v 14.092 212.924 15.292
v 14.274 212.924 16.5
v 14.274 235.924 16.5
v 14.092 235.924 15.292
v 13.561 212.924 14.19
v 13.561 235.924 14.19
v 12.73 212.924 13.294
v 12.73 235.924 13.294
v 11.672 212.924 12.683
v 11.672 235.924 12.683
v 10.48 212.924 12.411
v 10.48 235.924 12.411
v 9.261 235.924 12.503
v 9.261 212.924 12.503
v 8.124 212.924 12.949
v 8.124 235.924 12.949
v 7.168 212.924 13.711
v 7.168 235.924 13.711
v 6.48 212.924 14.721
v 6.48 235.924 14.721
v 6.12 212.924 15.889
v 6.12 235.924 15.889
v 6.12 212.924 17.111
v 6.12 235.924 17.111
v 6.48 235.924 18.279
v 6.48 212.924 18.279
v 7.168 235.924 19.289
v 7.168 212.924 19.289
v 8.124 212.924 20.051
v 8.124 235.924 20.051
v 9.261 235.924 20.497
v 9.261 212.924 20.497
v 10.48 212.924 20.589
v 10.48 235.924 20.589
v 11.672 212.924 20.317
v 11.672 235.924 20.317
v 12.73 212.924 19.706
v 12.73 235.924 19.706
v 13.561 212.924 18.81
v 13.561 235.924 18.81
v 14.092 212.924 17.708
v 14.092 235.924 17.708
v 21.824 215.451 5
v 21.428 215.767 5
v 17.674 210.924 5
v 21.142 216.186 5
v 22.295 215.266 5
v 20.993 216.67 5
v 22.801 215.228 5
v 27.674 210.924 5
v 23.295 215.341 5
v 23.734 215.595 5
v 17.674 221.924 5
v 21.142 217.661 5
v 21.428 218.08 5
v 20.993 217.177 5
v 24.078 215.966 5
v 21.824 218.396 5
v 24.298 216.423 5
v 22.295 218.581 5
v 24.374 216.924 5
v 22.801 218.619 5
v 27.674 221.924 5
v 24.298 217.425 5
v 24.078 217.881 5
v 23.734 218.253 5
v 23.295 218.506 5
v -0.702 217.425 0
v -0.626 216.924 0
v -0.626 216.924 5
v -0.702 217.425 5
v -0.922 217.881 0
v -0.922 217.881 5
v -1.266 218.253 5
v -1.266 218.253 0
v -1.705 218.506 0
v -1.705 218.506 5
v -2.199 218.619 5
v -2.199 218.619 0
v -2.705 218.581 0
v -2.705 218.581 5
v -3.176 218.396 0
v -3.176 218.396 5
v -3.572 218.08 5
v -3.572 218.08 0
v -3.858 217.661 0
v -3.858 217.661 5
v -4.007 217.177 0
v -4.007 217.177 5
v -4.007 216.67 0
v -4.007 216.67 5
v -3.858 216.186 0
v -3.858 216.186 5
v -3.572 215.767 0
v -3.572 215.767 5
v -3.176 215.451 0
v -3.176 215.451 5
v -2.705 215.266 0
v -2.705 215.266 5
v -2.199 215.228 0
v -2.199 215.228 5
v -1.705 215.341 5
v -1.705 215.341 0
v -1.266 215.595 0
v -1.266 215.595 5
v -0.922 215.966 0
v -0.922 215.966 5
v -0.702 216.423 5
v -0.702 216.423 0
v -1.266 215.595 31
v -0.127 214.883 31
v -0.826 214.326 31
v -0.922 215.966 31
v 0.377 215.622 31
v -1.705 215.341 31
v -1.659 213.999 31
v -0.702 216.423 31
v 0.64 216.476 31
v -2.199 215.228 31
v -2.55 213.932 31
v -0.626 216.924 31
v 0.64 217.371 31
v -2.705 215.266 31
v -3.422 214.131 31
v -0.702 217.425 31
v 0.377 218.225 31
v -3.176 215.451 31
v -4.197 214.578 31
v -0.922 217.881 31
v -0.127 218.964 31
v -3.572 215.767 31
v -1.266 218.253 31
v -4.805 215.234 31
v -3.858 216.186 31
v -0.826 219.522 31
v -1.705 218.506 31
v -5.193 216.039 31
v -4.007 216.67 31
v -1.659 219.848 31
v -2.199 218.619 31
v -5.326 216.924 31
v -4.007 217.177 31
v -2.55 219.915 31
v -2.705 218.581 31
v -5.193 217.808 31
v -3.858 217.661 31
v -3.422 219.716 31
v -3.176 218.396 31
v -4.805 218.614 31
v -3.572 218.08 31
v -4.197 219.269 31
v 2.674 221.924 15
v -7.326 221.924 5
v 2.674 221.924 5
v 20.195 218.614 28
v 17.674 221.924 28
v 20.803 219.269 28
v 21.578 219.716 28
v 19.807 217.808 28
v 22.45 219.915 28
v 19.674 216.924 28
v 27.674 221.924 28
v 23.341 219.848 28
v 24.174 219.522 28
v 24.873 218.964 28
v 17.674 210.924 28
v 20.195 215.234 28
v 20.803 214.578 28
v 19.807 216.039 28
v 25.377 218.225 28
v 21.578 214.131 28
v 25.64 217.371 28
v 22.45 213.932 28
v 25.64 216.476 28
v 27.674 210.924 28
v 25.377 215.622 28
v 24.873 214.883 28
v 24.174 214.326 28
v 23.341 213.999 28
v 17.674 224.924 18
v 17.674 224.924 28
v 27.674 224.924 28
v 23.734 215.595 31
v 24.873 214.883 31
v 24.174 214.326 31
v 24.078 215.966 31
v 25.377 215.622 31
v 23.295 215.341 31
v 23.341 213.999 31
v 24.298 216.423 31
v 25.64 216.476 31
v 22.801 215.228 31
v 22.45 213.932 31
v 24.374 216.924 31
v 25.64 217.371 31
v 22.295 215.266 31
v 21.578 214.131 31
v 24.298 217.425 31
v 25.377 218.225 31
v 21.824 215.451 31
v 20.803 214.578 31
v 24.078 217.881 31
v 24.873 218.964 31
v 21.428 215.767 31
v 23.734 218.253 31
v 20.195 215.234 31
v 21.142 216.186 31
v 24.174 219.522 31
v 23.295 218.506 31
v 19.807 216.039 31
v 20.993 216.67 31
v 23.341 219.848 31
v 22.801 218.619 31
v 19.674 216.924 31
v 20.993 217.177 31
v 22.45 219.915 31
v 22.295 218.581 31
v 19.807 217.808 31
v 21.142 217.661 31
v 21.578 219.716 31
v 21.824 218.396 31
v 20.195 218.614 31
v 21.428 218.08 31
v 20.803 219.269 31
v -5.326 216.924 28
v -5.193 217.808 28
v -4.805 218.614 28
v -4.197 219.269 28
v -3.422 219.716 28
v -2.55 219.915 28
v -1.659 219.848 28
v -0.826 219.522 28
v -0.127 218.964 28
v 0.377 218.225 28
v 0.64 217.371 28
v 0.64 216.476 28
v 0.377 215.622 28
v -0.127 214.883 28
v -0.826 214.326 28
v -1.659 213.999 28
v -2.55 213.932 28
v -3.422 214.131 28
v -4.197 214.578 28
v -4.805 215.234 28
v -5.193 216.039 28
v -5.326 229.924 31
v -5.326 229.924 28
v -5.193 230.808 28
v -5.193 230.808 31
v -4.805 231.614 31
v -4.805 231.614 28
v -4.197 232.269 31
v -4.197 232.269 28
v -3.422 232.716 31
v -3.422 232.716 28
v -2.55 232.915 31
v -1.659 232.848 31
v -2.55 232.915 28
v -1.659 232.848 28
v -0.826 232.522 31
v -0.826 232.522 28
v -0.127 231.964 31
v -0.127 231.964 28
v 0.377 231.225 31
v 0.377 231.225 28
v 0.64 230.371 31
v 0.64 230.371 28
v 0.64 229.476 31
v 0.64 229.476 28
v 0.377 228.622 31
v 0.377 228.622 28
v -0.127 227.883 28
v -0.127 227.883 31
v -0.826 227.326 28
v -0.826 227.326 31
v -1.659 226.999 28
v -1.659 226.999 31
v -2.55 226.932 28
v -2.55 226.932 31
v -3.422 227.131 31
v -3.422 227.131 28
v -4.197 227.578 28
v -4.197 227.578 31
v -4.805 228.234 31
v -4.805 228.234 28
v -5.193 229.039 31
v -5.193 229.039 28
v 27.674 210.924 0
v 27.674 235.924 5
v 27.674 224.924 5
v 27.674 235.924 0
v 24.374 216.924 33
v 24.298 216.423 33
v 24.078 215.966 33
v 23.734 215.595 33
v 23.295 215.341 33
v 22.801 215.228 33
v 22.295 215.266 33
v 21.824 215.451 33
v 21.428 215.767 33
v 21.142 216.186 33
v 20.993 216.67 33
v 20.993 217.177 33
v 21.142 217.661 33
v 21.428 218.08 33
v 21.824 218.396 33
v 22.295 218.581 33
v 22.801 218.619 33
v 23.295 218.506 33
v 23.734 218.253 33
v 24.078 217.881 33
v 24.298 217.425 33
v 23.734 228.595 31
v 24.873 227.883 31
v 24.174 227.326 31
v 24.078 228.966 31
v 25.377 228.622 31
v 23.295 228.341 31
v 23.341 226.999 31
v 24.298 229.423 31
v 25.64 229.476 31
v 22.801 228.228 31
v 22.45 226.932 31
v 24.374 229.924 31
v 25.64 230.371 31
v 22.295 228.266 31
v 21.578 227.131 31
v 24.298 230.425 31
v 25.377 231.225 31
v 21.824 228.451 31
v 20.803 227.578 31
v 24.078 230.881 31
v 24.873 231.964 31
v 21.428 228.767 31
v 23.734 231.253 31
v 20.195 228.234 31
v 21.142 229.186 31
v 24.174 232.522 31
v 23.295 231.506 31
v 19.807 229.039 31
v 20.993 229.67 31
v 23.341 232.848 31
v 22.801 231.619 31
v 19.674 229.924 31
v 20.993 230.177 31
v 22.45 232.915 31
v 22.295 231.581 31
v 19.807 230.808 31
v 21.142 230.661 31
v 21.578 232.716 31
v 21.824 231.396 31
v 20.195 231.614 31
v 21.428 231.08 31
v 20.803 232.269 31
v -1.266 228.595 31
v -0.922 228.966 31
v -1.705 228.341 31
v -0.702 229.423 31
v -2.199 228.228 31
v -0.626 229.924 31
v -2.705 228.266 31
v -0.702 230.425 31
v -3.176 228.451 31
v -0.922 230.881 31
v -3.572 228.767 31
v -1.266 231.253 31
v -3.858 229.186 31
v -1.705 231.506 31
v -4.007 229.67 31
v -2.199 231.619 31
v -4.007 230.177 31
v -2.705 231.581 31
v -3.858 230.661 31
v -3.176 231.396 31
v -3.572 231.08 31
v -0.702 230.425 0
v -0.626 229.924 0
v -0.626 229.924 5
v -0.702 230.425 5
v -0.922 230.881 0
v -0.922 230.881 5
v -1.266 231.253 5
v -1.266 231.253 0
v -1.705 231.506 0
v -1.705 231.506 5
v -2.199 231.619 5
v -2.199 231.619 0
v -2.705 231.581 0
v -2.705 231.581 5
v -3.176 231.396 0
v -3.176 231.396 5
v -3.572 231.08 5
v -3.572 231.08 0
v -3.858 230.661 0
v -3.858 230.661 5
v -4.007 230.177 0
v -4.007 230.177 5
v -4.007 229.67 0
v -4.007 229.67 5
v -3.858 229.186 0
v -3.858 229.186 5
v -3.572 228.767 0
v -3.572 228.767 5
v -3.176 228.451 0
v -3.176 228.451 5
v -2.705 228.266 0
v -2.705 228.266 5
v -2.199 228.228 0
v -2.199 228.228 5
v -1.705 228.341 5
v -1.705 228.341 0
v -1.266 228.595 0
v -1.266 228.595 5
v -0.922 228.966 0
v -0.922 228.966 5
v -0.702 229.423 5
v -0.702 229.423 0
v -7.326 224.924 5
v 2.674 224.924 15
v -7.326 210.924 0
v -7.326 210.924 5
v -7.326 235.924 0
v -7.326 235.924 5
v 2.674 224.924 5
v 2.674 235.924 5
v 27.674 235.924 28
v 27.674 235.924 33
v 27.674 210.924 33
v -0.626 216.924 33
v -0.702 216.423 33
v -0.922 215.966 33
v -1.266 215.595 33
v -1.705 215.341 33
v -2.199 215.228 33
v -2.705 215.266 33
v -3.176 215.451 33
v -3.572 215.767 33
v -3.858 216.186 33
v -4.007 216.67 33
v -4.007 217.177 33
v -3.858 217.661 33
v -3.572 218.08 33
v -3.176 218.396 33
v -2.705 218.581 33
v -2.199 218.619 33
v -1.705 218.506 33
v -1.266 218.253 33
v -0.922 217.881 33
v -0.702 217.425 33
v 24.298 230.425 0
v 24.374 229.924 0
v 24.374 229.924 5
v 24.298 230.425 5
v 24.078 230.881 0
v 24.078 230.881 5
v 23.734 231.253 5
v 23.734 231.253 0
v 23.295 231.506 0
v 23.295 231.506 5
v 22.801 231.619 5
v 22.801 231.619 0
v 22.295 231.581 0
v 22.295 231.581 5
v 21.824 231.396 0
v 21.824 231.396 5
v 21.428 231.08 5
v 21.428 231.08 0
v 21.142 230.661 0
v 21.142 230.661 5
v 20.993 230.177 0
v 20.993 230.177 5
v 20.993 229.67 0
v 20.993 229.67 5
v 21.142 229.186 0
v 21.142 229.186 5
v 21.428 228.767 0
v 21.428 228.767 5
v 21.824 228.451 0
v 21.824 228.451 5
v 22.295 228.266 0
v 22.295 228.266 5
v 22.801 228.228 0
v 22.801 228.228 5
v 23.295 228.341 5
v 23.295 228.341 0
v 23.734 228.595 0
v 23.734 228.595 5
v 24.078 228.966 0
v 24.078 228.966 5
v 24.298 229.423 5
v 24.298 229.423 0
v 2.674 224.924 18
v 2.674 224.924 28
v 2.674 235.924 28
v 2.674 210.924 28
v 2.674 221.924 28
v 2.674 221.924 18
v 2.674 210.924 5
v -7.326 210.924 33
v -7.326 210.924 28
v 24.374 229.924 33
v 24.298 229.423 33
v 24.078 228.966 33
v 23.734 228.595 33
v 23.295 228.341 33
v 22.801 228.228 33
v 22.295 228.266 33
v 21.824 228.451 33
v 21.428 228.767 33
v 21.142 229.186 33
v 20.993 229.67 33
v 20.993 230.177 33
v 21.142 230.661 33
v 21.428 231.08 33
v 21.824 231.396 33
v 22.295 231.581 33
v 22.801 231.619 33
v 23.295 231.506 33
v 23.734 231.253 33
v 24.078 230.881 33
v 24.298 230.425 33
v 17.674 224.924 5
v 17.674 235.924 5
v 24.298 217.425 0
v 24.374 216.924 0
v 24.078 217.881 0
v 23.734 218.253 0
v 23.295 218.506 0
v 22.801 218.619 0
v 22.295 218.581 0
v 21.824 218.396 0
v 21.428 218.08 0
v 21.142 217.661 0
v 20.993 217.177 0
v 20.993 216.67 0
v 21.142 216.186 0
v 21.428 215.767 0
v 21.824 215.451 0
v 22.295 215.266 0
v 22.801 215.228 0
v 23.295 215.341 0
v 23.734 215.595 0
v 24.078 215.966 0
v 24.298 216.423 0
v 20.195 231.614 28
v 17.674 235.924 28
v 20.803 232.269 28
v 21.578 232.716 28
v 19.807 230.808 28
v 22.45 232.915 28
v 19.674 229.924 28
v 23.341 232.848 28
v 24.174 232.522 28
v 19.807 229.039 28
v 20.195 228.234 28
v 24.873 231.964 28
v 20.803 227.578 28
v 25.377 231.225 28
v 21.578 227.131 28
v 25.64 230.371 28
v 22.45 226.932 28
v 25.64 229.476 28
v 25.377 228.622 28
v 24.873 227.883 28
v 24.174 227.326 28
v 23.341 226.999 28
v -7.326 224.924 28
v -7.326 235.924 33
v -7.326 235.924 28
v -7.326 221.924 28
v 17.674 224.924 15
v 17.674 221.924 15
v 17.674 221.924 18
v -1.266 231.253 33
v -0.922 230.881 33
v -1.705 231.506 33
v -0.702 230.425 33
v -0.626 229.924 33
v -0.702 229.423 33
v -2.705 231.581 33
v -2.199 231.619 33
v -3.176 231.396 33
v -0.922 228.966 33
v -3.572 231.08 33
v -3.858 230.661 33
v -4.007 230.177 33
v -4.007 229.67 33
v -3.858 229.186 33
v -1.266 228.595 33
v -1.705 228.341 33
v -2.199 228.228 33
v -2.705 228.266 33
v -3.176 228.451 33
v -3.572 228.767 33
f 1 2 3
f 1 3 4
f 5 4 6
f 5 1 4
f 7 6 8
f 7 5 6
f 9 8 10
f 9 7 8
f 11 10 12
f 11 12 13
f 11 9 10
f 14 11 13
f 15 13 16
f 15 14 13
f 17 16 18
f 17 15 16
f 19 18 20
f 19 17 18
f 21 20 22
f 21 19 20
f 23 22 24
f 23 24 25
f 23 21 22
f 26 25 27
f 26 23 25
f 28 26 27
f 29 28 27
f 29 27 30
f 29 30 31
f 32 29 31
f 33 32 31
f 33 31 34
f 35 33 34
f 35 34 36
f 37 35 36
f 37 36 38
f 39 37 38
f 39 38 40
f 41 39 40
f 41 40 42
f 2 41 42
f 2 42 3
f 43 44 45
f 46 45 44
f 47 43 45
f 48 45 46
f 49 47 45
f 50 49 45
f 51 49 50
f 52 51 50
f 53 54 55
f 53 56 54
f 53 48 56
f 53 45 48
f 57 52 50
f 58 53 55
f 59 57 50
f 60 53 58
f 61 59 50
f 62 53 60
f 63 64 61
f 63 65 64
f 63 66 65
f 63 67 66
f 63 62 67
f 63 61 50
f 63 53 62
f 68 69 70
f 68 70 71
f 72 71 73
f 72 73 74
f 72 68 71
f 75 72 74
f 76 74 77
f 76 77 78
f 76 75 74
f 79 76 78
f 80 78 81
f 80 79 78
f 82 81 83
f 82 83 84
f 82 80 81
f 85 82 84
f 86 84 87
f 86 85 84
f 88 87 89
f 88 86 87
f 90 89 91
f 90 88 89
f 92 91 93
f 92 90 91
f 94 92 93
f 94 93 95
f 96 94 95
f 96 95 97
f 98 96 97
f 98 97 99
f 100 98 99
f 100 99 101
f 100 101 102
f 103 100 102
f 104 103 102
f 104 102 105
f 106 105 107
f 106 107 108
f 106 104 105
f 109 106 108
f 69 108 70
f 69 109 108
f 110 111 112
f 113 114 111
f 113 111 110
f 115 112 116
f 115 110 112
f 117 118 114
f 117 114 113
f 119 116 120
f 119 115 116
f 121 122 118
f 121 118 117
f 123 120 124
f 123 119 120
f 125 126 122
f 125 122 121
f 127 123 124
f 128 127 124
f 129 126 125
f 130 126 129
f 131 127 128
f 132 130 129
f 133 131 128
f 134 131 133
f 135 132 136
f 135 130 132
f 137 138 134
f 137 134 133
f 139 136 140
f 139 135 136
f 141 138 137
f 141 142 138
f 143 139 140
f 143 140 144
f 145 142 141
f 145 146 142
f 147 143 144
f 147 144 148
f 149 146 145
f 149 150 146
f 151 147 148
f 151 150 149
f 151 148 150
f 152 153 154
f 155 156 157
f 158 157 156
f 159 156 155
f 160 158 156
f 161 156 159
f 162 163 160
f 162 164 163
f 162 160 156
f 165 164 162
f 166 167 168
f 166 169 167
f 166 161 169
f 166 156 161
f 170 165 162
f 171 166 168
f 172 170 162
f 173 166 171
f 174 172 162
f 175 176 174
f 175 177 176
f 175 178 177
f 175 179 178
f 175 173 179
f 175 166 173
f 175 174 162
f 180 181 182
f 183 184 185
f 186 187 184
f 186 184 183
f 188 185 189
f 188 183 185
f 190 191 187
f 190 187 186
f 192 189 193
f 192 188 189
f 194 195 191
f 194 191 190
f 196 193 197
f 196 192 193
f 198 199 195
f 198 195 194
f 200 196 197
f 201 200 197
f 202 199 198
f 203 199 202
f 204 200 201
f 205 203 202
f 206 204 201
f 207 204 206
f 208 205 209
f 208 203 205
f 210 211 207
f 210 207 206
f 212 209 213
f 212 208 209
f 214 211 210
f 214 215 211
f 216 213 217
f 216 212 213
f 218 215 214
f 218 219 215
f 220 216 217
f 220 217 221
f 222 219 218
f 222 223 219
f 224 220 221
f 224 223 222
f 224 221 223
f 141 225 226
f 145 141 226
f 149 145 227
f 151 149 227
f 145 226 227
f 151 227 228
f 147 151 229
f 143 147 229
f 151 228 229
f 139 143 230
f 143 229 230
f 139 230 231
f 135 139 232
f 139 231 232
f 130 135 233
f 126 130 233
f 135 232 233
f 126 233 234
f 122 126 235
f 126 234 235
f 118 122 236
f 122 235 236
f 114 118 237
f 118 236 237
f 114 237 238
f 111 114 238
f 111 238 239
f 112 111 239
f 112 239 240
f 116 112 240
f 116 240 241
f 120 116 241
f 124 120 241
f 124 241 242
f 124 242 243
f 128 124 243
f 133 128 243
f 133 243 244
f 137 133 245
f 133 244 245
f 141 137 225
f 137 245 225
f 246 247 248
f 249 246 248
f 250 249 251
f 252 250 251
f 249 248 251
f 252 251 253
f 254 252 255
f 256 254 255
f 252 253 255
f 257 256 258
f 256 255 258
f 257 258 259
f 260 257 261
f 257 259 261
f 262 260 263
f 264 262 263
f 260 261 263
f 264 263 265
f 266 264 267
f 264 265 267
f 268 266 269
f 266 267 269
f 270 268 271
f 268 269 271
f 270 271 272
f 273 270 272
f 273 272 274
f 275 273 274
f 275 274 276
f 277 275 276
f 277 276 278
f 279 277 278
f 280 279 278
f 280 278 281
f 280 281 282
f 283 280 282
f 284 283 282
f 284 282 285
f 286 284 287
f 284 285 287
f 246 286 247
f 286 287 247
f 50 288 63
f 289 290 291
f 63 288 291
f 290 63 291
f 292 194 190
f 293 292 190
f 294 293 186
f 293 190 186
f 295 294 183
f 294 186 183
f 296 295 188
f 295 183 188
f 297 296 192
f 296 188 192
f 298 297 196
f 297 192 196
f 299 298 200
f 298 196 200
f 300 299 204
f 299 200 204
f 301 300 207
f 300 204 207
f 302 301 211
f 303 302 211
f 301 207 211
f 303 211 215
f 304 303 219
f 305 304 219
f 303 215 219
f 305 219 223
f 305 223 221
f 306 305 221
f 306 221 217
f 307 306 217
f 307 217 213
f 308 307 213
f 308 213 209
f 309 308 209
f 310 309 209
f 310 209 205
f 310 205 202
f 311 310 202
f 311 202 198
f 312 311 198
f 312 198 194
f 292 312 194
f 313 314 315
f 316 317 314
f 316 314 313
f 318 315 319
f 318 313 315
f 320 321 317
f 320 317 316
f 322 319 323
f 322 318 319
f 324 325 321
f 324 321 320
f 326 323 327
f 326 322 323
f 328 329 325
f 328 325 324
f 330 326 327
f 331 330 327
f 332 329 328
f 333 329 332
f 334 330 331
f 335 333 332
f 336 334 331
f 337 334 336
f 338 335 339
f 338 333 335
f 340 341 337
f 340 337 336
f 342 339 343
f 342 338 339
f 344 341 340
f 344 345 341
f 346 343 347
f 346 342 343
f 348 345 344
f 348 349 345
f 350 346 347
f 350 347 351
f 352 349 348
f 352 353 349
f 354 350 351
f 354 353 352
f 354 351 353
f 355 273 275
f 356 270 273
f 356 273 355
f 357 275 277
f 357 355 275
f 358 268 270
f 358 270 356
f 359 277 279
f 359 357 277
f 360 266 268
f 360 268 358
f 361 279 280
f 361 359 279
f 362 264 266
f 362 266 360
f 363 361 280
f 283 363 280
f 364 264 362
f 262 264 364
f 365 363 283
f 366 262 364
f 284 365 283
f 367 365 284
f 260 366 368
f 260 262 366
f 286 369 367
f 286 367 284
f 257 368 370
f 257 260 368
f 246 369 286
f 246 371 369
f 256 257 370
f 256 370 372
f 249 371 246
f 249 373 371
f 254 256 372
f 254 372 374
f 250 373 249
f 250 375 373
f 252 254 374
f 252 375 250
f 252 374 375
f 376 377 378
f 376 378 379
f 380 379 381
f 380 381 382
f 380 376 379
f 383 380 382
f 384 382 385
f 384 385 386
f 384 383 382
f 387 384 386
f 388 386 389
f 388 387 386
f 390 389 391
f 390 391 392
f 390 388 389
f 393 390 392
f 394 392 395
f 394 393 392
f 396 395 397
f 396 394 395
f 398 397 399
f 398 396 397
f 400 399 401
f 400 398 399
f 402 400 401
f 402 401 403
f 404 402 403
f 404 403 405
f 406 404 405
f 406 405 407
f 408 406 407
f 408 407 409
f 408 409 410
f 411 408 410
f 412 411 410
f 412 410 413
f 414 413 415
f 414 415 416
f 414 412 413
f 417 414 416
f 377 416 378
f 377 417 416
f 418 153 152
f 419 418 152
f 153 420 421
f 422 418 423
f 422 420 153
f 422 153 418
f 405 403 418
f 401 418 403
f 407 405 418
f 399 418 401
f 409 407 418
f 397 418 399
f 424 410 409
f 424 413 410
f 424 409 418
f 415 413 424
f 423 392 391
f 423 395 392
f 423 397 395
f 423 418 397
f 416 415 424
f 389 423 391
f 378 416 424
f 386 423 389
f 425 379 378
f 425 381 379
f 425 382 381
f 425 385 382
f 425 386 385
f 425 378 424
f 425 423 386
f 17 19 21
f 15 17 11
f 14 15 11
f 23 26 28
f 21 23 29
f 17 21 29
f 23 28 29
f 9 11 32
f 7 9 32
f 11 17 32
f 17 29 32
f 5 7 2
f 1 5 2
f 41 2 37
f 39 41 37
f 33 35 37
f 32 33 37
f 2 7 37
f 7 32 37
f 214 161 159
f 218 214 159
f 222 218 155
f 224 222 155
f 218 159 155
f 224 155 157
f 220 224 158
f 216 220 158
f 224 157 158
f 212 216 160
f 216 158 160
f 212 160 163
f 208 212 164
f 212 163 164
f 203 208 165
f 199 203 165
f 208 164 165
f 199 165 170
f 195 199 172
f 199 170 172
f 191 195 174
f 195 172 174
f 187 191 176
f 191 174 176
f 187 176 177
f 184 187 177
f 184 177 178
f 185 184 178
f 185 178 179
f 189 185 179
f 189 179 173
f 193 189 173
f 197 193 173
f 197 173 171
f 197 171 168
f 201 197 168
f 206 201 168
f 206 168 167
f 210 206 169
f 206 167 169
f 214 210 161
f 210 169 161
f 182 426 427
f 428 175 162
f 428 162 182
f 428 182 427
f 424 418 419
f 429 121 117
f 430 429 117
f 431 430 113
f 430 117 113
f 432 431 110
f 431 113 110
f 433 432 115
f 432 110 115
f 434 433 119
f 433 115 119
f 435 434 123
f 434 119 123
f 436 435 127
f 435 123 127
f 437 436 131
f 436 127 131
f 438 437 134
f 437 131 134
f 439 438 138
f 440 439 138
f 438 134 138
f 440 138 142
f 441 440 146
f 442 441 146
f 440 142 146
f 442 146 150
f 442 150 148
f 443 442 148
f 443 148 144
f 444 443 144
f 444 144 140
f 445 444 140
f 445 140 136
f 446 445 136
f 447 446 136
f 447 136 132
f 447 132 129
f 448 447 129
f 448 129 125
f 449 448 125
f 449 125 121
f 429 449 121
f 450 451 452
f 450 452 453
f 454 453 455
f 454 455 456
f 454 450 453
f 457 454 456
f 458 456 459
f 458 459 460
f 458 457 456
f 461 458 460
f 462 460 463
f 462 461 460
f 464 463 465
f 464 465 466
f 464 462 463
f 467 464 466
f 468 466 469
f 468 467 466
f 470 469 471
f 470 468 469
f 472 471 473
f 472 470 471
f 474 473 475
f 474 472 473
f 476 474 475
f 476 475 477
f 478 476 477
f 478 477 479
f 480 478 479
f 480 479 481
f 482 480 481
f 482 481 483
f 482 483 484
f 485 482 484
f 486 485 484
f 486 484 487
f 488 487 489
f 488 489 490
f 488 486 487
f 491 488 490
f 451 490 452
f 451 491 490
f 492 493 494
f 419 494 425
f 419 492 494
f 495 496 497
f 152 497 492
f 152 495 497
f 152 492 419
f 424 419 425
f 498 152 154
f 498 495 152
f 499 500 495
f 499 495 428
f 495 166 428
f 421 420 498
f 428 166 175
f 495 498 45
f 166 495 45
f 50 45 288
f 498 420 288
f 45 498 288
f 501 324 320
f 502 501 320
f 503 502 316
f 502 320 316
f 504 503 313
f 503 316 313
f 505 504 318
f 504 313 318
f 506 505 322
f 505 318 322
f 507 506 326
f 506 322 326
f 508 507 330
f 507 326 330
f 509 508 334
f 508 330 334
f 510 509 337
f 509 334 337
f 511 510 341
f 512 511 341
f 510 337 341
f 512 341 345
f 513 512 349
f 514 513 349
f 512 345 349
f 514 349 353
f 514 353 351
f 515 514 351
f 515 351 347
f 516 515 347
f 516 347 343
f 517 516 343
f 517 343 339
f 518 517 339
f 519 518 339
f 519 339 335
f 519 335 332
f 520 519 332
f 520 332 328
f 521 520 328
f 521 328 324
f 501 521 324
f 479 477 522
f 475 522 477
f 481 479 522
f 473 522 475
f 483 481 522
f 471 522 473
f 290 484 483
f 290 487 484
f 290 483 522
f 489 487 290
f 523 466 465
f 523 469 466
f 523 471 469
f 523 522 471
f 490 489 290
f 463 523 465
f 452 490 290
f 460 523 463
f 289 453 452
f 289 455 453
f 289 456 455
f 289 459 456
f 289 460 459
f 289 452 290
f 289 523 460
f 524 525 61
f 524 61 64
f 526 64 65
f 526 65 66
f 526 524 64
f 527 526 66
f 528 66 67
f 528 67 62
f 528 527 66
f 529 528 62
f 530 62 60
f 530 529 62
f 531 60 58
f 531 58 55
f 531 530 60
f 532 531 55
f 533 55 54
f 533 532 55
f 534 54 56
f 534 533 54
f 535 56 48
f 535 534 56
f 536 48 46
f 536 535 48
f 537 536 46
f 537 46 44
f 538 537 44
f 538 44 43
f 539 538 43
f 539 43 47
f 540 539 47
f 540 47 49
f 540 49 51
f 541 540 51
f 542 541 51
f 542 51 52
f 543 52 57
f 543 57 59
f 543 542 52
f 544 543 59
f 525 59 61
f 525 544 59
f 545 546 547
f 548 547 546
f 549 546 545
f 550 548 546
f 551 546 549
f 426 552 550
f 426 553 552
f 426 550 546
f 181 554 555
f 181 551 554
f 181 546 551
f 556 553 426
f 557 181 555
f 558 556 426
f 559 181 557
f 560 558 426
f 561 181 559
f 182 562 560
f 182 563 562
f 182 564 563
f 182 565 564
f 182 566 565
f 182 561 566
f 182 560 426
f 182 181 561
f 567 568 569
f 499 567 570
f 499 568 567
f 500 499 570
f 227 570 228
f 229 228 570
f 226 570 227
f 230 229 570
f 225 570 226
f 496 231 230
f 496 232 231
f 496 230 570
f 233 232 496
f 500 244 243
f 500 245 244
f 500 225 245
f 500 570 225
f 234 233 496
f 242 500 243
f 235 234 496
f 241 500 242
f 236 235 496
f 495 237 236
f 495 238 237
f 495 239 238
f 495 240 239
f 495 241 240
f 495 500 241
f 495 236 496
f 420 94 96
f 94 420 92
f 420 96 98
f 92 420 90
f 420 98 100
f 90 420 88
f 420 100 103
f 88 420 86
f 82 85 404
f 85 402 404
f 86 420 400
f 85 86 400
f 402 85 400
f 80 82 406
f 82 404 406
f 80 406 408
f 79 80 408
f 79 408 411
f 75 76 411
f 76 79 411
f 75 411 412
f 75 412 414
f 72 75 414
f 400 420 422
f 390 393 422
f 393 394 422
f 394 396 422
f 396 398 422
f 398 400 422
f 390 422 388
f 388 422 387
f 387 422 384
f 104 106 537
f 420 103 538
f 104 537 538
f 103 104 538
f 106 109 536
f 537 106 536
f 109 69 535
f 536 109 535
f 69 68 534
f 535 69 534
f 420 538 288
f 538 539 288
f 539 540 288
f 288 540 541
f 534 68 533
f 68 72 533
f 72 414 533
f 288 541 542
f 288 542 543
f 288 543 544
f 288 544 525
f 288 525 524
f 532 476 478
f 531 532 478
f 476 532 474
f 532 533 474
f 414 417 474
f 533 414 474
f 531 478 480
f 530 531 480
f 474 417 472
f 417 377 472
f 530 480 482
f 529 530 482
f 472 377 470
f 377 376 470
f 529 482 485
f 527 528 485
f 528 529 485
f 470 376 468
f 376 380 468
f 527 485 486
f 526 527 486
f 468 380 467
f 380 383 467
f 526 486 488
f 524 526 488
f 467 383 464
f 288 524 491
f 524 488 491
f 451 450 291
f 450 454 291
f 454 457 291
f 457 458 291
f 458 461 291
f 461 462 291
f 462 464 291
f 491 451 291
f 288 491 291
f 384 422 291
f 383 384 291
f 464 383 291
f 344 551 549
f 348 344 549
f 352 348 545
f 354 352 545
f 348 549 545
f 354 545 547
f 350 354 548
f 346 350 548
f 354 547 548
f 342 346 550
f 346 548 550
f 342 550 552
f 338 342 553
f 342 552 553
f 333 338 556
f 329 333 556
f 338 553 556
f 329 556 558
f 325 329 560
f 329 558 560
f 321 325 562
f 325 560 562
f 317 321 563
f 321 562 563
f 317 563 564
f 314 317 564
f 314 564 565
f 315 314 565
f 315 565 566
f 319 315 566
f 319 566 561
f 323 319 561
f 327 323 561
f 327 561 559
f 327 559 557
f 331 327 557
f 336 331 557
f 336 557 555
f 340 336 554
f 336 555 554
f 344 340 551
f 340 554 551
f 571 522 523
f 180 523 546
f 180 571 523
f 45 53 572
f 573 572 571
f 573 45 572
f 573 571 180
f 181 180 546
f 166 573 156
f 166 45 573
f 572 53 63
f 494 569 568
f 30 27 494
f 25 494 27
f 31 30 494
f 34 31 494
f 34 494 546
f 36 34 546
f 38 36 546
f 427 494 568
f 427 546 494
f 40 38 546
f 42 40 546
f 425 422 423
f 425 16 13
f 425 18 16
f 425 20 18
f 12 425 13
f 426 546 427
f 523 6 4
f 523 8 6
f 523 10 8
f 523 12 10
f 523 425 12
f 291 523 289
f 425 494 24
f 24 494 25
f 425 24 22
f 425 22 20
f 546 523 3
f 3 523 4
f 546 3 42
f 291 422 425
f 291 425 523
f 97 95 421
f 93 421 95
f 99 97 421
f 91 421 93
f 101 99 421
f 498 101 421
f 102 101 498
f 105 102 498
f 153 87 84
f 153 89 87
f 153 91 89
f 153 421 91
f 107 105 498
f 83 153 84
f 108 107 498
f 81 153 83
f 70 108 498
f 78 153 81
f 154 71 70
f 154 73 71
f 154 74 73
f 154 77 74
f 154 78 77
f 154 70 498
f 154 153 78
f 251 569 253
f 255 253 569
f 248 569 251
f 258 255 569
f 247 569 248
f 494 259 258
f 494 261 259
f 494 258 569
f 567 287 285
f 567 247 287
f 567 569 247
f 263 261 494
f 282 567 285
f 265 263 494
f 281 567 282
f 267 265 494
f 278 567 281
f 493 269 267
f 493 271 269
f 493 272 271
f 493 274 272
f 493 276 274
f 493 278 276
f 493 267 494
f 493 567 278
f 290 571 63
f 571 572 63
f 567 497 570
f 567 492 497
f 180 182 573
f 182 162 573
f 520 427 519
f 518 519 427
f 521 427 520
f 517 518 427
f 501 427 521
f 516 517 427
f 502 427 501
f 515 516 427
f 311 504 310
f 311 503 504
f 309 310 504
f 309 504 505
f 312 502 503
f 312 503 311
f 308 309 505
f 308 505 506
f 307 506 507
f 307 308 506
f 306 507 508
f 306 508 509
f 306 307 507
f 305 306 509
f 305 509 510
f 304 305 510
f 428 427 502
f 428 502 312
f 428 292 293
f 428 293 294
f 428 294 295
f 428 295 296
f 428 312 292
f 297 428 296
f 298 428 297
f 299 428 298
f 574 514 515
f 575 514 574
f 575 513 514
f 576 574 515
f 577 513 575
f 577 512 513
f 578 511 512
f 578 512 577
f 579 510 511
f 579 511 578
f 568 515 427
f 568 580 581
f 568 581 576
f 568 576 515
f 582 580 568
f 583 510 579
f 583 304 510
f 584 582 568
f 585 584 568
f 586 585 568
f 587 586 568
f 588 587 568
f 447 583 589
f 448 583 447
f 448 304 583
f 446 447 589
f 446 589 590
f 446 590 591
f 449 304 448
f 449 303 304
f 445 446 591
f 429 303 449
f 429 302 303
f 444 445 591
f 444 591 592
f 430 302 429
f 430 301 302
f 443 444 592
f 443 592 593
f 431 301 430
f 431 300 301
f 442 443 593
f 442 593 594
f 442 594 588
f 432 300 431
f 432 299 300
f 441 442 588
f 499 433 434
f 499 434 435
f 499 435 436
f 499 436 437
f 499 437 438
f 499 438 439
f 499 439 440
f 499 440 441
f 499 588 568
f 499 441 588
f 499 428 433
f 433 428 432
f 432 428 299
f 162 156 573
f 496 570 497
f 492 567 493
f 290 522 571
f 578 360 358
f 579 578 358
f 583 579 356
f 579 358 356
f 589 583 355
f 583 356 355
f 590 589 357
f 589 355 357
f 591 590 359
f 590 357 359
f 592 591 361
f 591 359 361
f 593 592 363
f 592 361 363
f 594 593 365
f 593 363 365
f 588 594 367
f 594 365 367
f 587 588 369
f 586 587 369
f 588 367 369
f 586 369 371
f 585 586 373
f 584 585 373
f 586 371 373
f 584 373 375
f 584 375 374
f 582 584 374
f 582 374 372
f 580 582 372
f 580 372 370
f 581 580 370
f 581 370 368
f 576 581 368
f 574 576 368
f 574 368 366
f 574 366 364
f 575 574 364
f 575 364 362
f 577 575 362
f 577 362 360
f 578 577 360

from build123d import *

# Parameters (mm, degrees)
SKETCH1_W           = 35
SKETCH1_H           = 25
SKETCH1_R           = 1.7
BOSS_EXTRUDE1_DEPTH = 5
BOSS_EXTRUDE2_DEPTH = 25
SKETCH4_R           = 1.7
CUT_EXTRUDE1_DEPTH  = 5
SKETCH5_R           = 3
SKETCH5_R_2         = 1.7
CUT_EXTRUDE3_DEPTH  = 3
BOSS_EXTRUDE3_DEPTH = 2
BOSS_EXTRUDE4_DEPTH = 1.5


with BuildPart() as part:
    # Sketch1 → Boss-Extrude1 (new body)
    with BuildSketch(Plane.XY):
        with Locations((10.173766162, 223.42362241)):
            Rectangle(SKETCH1_W, SKETCH1_H)
        with Locations((22.673766162, 216.923622409)):
            Circle(SKETCH1_R, mode=Mode.SUBTRACT)
        with Locations((22.673766162, 229.923622409)):
            Circle(SKETCH1_R, mode=Mode.SUBTRACT)
        with Locations((-2.326233838, 229.923622409)):
            Circle(SKETCH1_R, mode=Mode.SUBTRACT)
        with Locations((-2.326233838, 216.923622409)):
            Circle(SKETCH1_R, mode=Mode.SUBTRACT)
    extrude(amount=BOSS_EXTRUDE1_DEPTH)

    # Sketch3 → Boss-Extrude2 (add)
    with BuildSketch(Plane.XZ.offset(-210.92362241)):
        with BuildLine():
            Line((17.673766162, 28), (2.673766162, 28))
            Line((2.673766162, 28), (2.673766162, 16.5))
            Line((2.673766162, 16.5), (6.073766162, 16.5))
            ThreePointArc((6.073766162, 16.5), (10.173766162, 20.6), (14.273766162, 16.5))
            Line((14.273766162, 16.5), (17.673766162, 16.5))
            Line((17.673766162, 16.5), (17.673766162, 28))
        make_face()
        with BuildLine():
            Line((6.073766162, 16.5), (2.673766162, 16.5))
            Line((2.673766162, 16.5), (2.673766162, 5))
            Line((2.673766162, 5), (17.673766162, 5))
            Line((17.673766162, 5), (17.673766162, 16.5))
            Line((17.673766162, 16.5), (14.273766162, 16.5))
            ThreePointArc((14.273766162, 16.5), (10.173766162, 12.4), (6.073766162, 16.5))
        make_face()
        Polygon((27.673766162, 33), (-7.326233838, 33), (-7.326233838, 28), (2.673766162, 28), (17.673766162, 28), (27.673766162, 28), align=None)
    extrude(amount=-BOSS_EXTRUDE2_DEPTH)

    # Sketch4 → Cut-Extrude1 (cut)
    with BuildSketch(Plane(origin=(0, 0, 28), x_dir=(-1, 0, 0), z_dir=(0, 0, -1))):
        with Locations(Location((-22.673766162, 229.923622409, 0), (0, 0, 180))):
            Circle(SKETCH4_R)
        with Locations(Location((-22.673766162, 216.923622409, 0), (0, 0, 180))):
            Circle(SKETCH4_R)
        with Locations(Location((2.326233838, 229.923622409, 0), (0, 0, 180))):
            Circle(SKETCH4_R)
        with Locations(Location((2.326233838, 216.923622409, 0), (0, 0, 180))):
            Circle(SKETCH4_R)
    extrude(amount=-CUT_EXTRUDE1_DEPTH, mode=Mode.SUBTRACT)

    # Sketch5 → Cut-Extrude3 (cut)
    # profile 1 of 4: a face of its own
    with BuildSketch(Plane(origin=(0, 0, 28), x_dir=(-1, 0, 0), z_dir=(0, 0, -1))):
        with Locations((2.326233838, 216.923622409)):
            Circle(SKETCH5_R)
        with Locations((2.326233838, 216.923622409)):
            Circle(SKETCH5_R_2, mode=Mode.SUBTRACT)
    # profile 2 of 4: a face of its own
    with BuildSketch(Plane(origin=(0, 0, 28), x_dir=(-1, 0, 0), z_dir=(0, 0, -1))):
        with Locations((2.326233838, 229.923622409)):
            Circle(SKETCH5_R)
        with Locations((2.326233838, 229.923622409)):
            Circle(SKETCH5_R_2, mode=Mode.SUBTRACT)
    # profile 3 of 4: a face of its own
    with BuildSketch(Plane(origin=(0, 0, 28), x_dir=(-1, 0, 0), z_dir=(0, 0, -1))):
        with Locations((-22.673766162, 216.923622409)):
            Circle(SKETCH5_R)
        with Locations((-22.673766162, 216.923622409)):
            Circle(SKETCH5_R_2, mode=Mode.SUBTRACT)
    # profile 4 of 4: a face of its own
    with BuildSketch(Plane(origin=(0, 0, 28), x_dir=(-1, 0, 0), z_dir=(0, 0, -1))):
        with Locations((-22.673766162, 229.923622409)):
            Circle(SKETCH5_R)
        with Locations((-22.673766162, 229.923622409)):
            Circle(SKETCH5_R_2, mode=Mode.SUBTRACT)
    extrude(amount=-CUT_EXTRUDE3_DEPTH, mode=Mode.SUBTRACT)

    # Sketch6 → Boss-Extrude3 (add)
    with BuildSketch(Plane.XZ.offset(-210.92362241)):
        Polygon((-7.326233838, 0), (27.673766162, 0), (27.673766162, 5), (17.673766162, 5), (17.673766162, 28), (27.673766162, 28), (27.673766162, 33), (-7.326233838, 33), (-7.326233838, 28), (2.673766162, 28), (2.673766162, 5), (-7.326233838, 5), align=None)
    extrude(amount=-BOSS_EXTRUDE3_DEPTH)

    # Sketch7 → Boss-Extrude4 (add, symmetric)
    with BuildSketch(Plane(origin=(0, 223.42362241, 0), x_dir=(1, 0, 0), z_dir=(0, 1, 0))):
        Polygon((17.673766162, -28), (27.673766162, -28), (17.673766162, -18), align=None)
        Polygon((17.673766162, -5), (17.673766162, -15), (27.673766162, -5), align=None)
        Polygon((-7.326233838, -5), (2.673766162, -15), (2.673766162, -5), align=None)
        Polygon((2.673766162, -18), (-7.326233838, -28), (2.673766162, -28), align=None)
    extrude(amount=BOSS_EXTRUDE4_DEPTH, both=True)


solid = part.part
